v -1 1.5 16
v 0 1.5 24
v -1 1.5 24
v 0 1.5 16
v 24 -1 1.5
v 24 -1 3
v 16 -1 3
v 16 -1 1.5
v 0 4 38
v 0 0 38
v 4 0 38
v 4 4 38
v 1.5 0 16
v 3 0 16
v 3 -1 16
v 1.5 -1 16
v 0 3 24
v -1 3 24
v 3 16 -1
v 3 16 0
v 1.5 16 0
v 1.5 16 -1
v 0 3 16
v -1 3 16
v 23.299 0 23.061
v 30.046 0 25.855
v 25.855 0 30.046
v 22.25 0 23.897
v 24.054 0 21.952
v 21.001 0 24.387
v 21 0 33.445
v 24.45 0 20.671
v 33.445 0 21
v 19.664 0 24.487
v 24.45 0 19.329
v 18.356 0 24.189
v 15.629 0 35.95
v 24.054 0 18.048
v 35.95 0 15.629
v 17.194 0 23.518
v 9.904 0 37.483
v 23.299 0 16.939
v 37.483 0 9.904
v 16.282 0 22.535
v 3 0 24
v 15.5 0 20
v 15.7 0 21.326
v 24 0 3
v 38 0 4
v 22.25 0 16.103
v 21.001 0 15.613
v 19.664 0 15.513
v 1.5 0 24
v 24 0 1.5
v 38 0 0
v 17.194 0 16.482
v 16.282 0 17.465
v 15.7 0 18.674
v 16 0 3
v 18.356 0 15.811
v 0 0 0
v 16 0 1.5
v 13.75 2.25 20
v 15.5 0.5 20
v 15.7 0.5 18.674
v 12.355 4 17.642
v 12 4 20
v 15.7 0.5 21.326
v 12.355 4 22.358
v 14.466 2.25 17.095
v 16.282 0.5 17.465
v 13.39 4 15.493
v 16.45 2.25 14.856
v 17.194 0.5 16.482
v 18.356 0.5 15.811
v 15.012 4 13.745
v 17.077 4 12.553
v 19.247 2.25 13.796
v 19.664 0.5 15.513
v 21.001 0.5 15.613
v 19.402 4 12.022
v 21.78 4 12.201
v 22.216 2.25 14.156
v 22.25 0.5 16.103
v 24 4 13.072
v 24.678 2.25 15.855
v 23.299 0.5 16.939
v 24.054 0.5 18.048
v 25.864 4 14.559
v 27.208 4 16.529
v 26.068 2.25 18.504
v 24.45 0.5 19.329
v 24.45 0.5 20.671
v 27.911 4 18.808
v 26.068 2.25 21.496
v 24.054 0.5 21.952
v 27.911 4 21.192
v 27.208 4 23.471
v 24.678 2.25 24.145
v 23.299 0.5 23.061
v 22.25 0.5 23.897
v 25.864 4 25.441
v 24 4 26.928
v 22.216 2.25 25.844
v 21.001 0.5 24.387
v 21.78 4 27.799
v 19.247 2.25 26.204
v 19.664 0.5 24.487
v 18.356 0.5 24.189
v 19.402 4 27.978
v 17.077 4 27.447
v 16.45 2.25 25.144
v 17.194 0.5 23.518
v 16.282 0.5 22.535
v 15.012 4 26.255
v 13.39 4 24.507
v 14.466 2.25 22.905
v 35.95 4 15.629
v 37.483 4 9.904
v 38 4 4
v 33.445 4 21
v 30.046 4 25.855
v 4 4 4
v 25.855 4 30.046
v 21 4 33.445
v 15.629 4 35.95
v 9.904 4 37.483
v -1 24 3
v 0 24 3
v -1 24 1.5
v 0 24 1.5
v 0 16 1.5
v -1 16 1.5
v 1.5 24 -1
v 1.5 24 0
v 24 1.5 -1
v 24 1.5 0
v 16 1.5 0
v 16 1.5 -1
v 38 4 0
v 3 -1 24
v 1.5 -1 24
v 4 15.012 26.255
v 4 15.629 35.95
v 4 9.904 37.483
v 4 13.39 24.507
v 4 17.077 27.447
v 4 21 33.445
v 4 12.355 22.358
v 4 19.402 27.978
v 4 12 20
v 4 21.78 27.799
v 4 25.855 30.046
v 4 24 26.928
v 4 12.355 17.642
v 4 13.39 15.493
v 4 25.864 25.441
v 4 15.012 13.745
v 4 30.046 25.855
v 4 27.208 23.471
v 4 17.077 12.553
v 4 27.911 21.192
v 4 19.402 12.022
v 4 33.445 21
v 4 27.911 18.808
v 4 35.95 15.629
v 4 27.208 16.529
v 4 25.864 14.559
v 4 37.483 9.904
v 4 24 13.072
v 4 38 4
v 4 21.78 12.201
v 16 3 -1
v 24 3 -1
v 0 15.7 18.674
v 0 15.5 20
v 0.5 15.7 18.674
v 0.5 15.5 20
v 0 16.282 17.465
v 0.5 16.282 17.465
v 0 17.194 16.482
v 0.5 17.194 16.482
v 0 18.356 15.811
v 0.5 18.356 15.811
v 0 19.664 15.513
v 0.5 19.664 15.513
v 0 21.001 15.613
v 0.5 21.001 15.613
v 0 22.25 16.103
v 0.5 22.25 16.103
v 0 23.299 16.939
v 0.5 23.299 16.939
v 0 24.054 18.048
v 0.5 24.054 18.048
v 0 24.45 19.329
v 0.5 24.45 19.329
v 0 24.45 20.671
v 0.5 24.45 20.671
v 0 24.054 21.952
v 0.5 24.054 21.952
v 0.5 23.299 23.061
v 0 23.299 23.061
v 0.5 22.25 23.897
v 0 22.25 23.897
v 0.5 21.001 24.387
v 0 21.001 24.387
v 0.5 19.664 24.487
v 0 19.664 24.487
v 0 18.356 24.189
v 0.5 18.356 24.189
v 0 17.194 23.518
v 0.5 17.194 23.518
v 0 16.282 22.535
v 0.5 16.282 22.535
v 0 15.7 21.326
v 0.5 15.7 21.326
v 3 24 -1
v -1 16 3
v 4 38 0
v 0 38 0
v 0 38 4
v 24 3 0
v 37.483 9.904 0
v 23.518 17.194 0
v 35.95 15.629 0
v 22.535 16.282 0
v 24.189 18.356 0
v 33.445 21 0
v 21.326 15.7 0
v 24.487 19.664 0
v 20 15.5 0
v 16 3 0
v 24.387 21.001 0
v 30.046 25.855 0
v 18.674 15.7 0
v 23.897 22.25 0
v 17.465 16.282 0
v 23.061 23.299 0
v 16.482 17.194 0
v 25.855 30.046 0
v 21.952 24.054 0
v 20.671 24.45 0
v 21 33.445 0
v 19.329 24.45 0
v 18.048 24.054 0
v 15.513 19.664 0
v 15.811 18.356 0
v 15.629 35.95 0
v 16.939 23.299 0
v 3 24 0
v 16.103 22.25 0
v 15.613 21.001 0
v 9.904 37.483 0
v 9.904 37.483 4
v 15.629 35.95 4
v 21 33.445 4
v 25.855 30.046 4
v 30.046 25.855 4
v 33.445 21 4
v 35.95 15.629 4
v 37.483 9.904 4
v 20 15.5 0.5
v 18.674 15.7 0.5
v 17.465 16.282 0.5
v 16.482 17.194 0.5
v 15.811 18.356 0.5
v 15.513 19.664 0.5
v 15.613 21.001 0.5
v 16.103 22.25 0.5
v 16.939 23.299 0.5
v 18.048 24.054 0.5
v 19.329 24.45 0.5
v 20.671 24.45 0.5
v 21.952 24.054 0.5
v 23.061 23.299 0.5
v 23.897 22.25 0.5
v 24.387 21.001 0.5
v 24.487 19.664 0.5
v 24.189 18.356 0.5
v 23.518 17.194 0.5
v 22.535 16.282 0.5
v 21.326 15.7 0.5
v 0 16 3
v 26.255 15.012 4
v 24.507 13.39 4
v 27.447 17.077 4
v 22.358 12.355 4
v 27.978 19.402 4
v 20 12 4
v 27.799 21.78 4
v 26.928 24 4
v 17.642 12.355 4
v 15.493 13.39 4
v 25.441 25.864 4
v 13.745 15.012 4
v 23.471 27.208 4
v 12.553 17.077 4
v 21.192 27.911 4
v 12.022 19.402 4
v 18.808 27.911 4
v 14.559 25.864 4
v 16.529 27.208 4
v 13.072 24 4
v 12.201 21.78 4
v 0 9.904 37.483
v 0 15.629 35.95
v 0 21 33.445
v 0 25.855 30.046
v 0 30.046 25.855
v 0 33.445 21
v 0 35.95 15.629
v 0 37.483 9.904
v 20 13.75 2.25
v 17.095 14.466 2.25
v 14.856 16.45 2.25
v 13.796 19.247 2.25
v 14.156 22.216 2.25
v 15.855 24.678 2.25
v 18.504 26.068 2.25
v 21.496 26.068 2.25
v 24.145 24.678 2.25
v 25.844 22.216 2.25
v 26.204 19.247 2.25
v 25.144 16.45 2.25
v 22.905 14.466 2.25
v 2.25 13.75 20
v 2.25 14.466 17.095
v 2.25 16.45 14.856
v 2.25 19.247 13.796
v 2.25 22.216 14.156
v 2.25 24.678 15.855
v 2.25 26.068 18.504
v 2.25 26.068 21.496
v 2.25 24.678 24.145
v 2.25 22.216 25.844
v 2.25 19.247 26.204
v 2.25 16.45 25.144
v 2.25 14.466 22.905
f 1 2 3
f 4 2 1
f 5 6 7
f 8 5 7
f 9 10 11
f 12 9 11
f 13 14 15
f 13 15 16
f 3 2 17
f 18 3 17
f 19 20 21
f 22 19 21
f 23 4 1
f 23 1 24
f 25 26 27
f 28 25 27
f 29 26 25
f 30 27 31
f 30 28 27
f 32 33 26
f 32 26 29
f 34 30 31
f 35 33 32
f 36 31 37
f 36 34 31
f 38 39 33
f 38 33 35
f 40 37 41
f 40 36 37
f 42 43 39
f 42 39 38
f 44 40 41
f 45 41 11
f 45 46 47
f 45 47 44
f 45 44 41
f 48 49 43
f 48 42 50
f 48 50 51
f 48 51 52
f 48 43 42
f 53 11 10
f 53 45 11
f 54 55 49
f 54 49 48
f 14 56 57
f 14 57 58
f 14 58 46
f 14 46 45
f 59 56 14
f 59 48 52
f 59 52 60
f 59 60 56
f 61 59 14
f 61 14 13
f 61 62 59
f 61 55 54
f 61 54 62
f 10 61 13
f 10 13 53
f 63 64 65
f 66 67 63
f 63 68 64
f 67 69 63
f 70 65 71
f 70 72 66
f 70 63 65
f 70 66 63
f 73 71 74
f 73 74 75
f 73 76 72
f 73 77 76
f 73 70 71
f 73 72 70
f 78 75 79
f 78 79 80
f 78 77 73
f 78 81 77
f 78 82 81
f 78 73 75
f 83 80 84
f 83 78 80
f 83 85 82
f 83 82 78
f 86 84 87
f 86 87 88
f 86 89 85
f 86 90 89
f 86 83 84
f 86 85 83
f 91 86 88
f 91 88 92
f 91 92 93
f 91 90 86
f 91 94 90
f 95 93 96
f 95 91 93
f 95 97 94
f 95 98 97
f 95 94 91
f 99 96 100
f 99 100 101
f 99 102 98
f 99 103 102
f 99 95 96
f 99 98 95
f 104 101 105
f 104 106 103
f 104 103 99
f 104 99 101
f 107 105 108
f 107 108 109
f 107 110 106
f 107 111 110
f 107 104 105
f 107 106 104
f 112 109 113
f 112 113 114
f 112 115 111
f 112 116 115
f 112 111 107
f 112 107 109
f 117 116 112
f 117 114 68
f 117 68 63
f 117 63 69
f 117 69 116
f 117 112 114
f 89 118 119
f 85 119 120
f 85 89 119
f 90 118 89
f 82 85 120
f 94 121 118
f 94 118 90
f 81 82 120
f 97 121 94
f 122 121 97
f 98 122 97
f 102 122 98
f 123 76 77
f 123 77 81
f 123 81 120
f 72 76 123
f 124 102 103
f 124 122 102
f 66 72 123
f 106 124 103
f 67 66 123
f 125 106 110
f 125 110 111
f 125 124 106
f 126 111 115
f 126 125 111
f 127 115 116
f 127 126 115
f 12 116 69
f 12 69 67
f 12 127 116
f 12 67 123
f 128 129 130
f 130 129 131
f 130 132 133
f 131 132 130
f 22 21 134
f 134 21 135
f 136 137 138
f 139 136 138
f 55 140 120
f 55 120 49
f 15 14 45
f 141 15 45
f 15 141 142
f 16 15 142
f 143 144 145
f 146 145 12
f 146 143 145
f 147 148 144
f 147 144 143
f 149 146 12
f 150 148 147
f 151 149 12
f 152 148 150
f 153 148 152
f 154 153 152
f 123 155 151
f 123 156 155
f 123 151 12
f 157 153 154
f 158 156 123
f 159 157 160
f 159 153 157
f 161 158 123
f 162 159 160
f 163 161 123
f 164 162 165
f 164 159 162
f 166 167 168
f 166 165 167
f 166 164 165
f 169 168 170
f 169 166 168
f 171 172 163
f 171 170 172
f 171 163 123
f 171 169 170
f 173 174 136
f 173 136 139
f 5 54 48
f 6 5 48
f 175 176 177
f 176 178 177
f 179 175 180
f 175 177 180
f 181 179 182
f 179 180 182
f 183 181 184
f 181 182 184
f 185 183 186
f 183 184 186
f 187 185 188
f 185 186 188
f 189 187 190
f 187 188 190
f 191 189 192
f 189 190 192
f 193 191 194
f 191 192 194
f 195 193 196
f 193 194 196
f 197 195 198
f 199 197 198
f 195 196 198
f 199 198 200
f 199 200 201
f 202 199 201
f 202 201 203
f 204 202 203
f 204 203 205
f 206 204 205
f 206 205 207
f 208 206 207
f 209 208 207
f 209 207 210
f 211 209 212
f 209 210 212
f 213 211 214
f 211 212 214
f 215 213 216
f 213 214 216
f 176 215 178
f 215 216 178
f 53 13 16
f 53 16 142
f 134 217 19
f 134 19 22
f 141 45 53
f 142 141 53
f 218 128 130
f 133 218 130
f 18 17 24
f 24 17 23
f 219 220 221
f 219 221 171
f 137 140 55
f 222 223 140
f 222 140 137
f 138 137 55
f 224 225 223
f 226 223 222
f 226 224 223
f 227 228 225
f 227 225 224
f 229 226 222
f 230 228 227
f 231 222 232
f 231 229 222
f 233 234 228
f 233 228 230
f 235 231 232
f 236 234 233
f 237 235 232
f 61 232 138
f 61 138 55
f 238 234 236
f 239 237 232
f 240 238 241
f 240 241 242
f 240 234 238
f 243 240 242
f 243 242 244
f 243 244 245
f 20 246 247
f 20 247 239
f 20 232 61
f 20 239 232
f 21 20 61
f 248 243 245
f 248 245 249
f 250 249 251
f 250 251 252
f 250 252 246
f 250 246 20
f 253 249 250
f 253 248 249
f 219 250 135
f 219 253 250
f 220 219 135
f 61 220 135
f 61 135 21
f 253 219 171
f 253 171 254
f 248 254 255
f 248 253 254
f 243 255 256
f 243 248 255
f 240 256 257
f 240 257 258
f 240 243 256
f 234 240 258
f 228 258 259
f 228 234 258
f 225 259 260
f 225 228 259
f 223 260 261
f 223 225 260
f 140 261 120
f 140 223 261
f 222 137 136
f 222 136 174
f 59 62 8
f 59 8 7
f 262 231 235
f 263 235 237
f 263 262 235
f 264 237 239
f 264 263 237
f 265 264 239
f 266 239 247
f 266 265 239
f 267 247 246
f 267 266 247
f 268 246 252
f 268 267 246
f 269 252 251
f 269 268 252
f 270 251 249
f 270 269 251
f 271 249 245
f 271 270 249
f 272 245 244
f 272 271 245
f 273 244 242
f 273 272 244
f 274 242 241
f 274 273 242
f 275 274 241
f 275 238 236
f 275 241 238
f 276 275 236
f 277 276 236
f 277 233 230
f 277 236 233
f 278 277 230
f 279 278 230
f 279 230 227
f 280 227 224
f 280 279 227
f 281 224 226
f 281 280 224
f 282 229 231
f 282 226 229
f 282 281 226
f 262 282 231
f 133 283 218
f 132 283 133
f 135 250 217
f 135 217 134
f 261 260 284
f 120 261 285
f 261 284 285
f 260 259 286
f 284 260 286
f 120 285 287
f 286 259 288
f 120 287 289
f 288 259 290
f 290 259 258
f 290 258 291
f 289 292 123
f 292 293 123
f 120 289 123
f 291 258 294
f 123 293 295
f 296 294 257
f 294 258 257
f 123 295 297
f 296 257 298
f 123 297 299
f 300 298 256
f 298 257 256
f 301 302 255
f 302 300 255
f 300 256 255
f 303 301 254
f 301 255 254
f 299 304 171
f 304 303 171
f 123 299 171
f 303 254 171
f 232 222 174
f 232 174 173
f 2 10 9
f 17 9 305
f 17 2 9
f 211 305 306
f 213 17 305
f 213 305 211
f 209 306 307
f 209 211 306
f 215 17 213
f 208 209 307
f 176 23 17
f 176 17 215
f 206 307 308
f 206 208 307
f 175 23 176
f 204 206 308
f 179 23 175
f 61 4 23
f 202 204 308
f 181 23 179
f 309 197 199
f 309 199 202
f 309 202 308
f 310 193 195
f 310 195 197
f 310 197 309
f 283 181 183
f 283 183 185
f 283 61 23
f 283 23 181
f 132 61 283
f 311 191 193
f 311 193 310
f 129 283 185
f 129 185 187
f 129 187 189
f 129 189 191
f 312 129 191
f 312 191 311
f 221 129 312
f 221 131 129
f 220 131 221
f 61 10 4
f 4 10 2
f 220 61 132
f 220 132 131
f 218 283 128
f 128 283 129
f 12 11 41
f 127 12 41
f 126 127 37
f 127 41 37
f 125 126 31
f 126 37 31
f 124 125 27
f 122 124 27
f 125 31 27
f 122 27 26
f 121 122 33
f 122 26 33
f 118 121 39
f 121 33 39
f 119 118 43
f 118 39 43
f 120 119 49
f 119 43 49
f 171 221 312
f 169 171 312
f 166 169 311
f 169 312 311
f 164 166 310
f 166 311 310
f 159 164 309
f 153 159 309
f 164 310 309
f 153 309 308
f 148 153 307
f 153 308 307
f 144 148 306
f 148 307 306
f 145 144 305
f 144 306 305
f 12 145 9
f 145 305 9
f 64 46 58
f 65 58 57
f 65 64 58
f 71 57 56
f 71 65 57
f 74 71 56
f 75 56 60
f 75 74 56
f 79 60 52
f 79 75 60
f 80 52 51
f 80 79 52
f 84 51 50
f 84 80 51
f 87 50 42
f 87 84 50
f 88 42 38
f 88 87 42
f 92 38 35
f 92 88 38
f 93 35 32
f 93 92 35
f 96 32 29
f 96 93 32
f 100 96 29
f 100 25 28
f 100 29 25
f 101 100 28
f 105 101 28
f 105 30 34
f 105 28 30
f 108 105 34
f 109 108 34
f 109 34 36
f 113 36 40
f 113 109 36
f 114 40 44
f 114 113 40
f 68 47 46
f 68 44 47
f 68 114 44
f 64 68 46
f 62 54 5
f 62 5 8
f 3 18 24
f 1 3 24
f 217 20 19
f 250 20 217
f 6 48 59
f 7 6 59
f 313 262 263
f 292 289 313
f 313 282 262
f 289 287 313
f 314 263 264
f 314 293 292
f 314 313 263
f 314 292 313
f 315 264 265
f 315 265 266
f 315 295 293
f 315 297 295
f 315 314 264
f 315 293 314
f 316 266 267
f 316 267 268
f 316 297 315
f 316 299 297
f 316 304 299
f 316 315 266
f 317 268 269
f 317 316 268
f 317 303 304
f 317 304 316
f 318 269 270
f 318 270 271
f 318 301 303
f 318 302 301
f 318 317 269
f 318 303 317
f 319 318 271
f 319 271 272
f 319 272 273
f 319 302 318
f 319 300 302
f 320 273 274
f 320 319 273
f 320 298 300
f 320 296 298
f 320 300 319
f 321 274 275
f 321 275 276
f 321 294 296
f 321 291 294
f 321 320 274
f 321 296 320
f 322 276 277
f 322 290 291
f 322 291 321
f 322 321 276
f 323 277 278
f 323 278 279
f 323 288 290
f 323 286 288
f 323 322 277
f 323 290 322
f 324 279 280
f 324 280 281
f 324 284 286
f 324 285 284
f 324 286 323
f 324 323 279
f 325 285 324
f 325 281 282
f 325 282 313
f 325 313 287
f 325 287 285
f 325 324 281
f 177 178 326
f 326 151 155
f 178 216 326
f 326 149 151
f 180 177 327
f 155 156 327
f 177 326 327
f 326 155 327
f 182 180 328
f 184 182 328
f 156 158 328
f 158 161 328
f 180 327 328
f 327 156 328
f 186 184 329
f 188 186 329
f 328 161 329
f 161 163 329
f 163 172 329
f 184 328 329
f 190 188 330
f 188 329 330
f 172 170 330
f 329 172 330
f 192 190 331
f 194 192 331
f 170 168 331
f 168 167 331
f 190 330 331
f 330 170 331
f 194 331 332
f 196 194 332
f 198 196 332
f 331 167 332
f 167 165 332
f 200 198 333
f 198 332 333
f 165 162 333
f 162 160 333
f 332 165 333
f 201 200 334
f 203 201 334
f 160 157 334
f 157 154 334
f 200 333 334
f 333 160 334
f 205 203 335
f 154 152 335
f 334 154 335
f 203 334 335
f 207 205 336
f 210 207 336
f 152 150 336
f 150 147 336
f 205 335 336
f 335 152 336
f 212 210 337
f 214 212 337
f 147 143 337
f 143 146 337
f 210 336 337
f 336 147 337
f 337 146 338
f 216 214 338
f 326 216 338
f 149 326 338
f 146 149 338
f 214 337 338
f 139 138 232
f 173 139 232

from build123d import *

# Parameters (mm, degrees)
EXTRUDE_1_DEPTH            = 4
SKETCH_4_W                 = 1.5
SKETCH_4_H                 = 8
SKETCH_4_W_2               = 8
SKETCH_4_H_2               = 1.5
EXTRUDE_2_DEPTH            = 1
MIRROR_2_COPY_1_DEPTH      = 4
MIRROR_2_COPY_3_SKETCH_W   = 1.5
MIRROR_2_COPY_3_SKETCH_H   = 8
MIRROR_2_COPY_3_SKETCH_W_2 = 8
MIRROR_2_COPY_3_SKETCH_H_2 = 1.5
MIRROR_2_COPY_3_DEPTH      = 1


with BuildPart() as part:
    # Эскиз1 → Бобышка-Вытянуть1 (new body)
    with BuildSketch(Plane.XY):
        with BuildLine():
            Line((0, 0), (0, 38))
            Line((0, 38), (4, 38))
            ThreePointArc((4, 38), (28.04163056, 28.04163056), (38, 4))
            Line((38, 4), (38, 0))
            Line((38, 0), (0, 0))
        make_face()
    extrude_1 = extrude(amount=EXTRUDE_1_DEPTH)

    # Эскиз3 → Зенковка для винта с полупотайной головкой M81 (revolve, cut)
    with BuildSketch(Plane(origin=(20, 20, 4), x_dir=(0, -1, 0), z_dir=(1, 0, 0))):
        Polygon((0, 0), (0, 11.953872786), (4.5, 9.25), (4.5, 3.5), (8, 0), align=None)
    hole_wizard_m81 = revolve(axis=Axis((20, 20, 10.35), (0, 0, -1)), mode=Mode.SUBTRACT)

    # Эскиз4 → Бобышка-Вытянуть2 (add)
    with BuildSketch(Plane(origin=(0, 0, 0), x_dir=(-1, 0, 0), z_dir=(0, 0, -1))):
        with Locations((-2.25, 20)):
            Rectangle(SKETCH_4_W, SKETCH_4_H)
        with Locations((-20, 2.25)):
            Rectangle(SKETCH_4_W_2, SKETCH_4_H_2)
    extrude_2 = extrude(amount=EXTRUDE_2_DEPTH)

    # Зеркальное отражение1: Бобышка-Вытянуть1, Зенковка для винта с полупотайной головкой M81, Бобышка-Вытянуть2 across plane
    add(extrude_1.mirror(Plane(origin=(0, 0, 0), x_dir=(0, 0.707106781, 0.707106781), z_dir=(0, -0.707106781, 0.707106781))))
    add(hole_wizard_m81.mirror(Plane(origin=(0, 0, 0), x_dir=(0, 0.707106781, 0.707106781), z_dir=(0, -0.707106781, 0.707106781))), mode=Mode.SUBTRACT)
    add(extrude_2.mirror(Plane(origin=(0, 0, 0), x_dir=(0, 0.707106781, 0.707106781), z_dir=(0, -0.707106781, 0.707106781))))

    # Зеркальное отражение2: Бобышка-Вытянуть1, Зенковка для винта с полупотайной головкой M81, Бобышка-Вытянуть2 across plane
    add(extrude_1.mirror(Plane(origin=(0, 0, 0), x_dir=(0.707106781, 0, 0.707106781), z_dir=(-0.707106781, 0, 0.707106781))))
    add(hole_wizard_m81.mirror(Plane(origin=(0, 0, 0), x_dir=(0.707106781, 0, 0.707106781), z_dir=(-0.707106781, 0, 0.707106781))), mode=Mode.SUBTRACT)
    add(extrude_2.mirror(Plane(origin=(0, 0, 0), x_dir=(0.707106781, 0, 0.707106781), z_dir=(-0.707106781, 0, 0.707106781))))

    # Зеркальное отражение2 copy 1 sketch → Зеркальное отражение2 copy 1 (add)
    with BuildSketch(Plane.ZX):
        with BuildLine():
            Line((0, 0), (0, 38))
            Line((0, 38), (4, 38))
            ThreePointArc((4, 38), (28.04163056, 28.04163056), (38, 4))
            Line((38, 4), (38, 0))
            Line((38, 0), (0, 0))
        make_face()
    extrude(amount=MIRROR_2_COPY_1_DEPTH)

    # Зеркальное отражение2 copy 2 sketch → Зеркальное отражение2 copy 2 (revolve, cut)
    with BuildSketch(Plane(origin=(20, 4, 20), x_dir=(-1, 0, 0), z_dir=(0, 0, 1))):
        Polygon((0, 0), (0, 11.953872786), (4.5, 9.25), (4.5, 3.5), (8, 0), align=None)
    revolve(axis=Axis((20, 10.35, 20), (0, -1, 0)), mode=Mode.SUBTRACT)

    # Зеркальное отражение2 copy 3 sketch → Зеркальное отражение2 copy 3 (add)
    with BuildSketch(Plane(origin=(0, 0, 0), x_dir=(0, 0, -1), z_dir=(0, -1, 0))):
        with Locations((-2.25, 20)):
            Rectangle(MIRROR_2_COPY_3_SKETCH_W, MIRROR_2_COPY_3_SKETCH_H)
        with Locations((-20, 2.25)):
            Rectangle(MIRROR_2_COPY_3_SKETCH_W_2, MIRROR_2_COPY_3_SKETCH_H_2)
    extrude(amount=MIRROR_2_COPY_3_DEPTH)


solid = part.part
